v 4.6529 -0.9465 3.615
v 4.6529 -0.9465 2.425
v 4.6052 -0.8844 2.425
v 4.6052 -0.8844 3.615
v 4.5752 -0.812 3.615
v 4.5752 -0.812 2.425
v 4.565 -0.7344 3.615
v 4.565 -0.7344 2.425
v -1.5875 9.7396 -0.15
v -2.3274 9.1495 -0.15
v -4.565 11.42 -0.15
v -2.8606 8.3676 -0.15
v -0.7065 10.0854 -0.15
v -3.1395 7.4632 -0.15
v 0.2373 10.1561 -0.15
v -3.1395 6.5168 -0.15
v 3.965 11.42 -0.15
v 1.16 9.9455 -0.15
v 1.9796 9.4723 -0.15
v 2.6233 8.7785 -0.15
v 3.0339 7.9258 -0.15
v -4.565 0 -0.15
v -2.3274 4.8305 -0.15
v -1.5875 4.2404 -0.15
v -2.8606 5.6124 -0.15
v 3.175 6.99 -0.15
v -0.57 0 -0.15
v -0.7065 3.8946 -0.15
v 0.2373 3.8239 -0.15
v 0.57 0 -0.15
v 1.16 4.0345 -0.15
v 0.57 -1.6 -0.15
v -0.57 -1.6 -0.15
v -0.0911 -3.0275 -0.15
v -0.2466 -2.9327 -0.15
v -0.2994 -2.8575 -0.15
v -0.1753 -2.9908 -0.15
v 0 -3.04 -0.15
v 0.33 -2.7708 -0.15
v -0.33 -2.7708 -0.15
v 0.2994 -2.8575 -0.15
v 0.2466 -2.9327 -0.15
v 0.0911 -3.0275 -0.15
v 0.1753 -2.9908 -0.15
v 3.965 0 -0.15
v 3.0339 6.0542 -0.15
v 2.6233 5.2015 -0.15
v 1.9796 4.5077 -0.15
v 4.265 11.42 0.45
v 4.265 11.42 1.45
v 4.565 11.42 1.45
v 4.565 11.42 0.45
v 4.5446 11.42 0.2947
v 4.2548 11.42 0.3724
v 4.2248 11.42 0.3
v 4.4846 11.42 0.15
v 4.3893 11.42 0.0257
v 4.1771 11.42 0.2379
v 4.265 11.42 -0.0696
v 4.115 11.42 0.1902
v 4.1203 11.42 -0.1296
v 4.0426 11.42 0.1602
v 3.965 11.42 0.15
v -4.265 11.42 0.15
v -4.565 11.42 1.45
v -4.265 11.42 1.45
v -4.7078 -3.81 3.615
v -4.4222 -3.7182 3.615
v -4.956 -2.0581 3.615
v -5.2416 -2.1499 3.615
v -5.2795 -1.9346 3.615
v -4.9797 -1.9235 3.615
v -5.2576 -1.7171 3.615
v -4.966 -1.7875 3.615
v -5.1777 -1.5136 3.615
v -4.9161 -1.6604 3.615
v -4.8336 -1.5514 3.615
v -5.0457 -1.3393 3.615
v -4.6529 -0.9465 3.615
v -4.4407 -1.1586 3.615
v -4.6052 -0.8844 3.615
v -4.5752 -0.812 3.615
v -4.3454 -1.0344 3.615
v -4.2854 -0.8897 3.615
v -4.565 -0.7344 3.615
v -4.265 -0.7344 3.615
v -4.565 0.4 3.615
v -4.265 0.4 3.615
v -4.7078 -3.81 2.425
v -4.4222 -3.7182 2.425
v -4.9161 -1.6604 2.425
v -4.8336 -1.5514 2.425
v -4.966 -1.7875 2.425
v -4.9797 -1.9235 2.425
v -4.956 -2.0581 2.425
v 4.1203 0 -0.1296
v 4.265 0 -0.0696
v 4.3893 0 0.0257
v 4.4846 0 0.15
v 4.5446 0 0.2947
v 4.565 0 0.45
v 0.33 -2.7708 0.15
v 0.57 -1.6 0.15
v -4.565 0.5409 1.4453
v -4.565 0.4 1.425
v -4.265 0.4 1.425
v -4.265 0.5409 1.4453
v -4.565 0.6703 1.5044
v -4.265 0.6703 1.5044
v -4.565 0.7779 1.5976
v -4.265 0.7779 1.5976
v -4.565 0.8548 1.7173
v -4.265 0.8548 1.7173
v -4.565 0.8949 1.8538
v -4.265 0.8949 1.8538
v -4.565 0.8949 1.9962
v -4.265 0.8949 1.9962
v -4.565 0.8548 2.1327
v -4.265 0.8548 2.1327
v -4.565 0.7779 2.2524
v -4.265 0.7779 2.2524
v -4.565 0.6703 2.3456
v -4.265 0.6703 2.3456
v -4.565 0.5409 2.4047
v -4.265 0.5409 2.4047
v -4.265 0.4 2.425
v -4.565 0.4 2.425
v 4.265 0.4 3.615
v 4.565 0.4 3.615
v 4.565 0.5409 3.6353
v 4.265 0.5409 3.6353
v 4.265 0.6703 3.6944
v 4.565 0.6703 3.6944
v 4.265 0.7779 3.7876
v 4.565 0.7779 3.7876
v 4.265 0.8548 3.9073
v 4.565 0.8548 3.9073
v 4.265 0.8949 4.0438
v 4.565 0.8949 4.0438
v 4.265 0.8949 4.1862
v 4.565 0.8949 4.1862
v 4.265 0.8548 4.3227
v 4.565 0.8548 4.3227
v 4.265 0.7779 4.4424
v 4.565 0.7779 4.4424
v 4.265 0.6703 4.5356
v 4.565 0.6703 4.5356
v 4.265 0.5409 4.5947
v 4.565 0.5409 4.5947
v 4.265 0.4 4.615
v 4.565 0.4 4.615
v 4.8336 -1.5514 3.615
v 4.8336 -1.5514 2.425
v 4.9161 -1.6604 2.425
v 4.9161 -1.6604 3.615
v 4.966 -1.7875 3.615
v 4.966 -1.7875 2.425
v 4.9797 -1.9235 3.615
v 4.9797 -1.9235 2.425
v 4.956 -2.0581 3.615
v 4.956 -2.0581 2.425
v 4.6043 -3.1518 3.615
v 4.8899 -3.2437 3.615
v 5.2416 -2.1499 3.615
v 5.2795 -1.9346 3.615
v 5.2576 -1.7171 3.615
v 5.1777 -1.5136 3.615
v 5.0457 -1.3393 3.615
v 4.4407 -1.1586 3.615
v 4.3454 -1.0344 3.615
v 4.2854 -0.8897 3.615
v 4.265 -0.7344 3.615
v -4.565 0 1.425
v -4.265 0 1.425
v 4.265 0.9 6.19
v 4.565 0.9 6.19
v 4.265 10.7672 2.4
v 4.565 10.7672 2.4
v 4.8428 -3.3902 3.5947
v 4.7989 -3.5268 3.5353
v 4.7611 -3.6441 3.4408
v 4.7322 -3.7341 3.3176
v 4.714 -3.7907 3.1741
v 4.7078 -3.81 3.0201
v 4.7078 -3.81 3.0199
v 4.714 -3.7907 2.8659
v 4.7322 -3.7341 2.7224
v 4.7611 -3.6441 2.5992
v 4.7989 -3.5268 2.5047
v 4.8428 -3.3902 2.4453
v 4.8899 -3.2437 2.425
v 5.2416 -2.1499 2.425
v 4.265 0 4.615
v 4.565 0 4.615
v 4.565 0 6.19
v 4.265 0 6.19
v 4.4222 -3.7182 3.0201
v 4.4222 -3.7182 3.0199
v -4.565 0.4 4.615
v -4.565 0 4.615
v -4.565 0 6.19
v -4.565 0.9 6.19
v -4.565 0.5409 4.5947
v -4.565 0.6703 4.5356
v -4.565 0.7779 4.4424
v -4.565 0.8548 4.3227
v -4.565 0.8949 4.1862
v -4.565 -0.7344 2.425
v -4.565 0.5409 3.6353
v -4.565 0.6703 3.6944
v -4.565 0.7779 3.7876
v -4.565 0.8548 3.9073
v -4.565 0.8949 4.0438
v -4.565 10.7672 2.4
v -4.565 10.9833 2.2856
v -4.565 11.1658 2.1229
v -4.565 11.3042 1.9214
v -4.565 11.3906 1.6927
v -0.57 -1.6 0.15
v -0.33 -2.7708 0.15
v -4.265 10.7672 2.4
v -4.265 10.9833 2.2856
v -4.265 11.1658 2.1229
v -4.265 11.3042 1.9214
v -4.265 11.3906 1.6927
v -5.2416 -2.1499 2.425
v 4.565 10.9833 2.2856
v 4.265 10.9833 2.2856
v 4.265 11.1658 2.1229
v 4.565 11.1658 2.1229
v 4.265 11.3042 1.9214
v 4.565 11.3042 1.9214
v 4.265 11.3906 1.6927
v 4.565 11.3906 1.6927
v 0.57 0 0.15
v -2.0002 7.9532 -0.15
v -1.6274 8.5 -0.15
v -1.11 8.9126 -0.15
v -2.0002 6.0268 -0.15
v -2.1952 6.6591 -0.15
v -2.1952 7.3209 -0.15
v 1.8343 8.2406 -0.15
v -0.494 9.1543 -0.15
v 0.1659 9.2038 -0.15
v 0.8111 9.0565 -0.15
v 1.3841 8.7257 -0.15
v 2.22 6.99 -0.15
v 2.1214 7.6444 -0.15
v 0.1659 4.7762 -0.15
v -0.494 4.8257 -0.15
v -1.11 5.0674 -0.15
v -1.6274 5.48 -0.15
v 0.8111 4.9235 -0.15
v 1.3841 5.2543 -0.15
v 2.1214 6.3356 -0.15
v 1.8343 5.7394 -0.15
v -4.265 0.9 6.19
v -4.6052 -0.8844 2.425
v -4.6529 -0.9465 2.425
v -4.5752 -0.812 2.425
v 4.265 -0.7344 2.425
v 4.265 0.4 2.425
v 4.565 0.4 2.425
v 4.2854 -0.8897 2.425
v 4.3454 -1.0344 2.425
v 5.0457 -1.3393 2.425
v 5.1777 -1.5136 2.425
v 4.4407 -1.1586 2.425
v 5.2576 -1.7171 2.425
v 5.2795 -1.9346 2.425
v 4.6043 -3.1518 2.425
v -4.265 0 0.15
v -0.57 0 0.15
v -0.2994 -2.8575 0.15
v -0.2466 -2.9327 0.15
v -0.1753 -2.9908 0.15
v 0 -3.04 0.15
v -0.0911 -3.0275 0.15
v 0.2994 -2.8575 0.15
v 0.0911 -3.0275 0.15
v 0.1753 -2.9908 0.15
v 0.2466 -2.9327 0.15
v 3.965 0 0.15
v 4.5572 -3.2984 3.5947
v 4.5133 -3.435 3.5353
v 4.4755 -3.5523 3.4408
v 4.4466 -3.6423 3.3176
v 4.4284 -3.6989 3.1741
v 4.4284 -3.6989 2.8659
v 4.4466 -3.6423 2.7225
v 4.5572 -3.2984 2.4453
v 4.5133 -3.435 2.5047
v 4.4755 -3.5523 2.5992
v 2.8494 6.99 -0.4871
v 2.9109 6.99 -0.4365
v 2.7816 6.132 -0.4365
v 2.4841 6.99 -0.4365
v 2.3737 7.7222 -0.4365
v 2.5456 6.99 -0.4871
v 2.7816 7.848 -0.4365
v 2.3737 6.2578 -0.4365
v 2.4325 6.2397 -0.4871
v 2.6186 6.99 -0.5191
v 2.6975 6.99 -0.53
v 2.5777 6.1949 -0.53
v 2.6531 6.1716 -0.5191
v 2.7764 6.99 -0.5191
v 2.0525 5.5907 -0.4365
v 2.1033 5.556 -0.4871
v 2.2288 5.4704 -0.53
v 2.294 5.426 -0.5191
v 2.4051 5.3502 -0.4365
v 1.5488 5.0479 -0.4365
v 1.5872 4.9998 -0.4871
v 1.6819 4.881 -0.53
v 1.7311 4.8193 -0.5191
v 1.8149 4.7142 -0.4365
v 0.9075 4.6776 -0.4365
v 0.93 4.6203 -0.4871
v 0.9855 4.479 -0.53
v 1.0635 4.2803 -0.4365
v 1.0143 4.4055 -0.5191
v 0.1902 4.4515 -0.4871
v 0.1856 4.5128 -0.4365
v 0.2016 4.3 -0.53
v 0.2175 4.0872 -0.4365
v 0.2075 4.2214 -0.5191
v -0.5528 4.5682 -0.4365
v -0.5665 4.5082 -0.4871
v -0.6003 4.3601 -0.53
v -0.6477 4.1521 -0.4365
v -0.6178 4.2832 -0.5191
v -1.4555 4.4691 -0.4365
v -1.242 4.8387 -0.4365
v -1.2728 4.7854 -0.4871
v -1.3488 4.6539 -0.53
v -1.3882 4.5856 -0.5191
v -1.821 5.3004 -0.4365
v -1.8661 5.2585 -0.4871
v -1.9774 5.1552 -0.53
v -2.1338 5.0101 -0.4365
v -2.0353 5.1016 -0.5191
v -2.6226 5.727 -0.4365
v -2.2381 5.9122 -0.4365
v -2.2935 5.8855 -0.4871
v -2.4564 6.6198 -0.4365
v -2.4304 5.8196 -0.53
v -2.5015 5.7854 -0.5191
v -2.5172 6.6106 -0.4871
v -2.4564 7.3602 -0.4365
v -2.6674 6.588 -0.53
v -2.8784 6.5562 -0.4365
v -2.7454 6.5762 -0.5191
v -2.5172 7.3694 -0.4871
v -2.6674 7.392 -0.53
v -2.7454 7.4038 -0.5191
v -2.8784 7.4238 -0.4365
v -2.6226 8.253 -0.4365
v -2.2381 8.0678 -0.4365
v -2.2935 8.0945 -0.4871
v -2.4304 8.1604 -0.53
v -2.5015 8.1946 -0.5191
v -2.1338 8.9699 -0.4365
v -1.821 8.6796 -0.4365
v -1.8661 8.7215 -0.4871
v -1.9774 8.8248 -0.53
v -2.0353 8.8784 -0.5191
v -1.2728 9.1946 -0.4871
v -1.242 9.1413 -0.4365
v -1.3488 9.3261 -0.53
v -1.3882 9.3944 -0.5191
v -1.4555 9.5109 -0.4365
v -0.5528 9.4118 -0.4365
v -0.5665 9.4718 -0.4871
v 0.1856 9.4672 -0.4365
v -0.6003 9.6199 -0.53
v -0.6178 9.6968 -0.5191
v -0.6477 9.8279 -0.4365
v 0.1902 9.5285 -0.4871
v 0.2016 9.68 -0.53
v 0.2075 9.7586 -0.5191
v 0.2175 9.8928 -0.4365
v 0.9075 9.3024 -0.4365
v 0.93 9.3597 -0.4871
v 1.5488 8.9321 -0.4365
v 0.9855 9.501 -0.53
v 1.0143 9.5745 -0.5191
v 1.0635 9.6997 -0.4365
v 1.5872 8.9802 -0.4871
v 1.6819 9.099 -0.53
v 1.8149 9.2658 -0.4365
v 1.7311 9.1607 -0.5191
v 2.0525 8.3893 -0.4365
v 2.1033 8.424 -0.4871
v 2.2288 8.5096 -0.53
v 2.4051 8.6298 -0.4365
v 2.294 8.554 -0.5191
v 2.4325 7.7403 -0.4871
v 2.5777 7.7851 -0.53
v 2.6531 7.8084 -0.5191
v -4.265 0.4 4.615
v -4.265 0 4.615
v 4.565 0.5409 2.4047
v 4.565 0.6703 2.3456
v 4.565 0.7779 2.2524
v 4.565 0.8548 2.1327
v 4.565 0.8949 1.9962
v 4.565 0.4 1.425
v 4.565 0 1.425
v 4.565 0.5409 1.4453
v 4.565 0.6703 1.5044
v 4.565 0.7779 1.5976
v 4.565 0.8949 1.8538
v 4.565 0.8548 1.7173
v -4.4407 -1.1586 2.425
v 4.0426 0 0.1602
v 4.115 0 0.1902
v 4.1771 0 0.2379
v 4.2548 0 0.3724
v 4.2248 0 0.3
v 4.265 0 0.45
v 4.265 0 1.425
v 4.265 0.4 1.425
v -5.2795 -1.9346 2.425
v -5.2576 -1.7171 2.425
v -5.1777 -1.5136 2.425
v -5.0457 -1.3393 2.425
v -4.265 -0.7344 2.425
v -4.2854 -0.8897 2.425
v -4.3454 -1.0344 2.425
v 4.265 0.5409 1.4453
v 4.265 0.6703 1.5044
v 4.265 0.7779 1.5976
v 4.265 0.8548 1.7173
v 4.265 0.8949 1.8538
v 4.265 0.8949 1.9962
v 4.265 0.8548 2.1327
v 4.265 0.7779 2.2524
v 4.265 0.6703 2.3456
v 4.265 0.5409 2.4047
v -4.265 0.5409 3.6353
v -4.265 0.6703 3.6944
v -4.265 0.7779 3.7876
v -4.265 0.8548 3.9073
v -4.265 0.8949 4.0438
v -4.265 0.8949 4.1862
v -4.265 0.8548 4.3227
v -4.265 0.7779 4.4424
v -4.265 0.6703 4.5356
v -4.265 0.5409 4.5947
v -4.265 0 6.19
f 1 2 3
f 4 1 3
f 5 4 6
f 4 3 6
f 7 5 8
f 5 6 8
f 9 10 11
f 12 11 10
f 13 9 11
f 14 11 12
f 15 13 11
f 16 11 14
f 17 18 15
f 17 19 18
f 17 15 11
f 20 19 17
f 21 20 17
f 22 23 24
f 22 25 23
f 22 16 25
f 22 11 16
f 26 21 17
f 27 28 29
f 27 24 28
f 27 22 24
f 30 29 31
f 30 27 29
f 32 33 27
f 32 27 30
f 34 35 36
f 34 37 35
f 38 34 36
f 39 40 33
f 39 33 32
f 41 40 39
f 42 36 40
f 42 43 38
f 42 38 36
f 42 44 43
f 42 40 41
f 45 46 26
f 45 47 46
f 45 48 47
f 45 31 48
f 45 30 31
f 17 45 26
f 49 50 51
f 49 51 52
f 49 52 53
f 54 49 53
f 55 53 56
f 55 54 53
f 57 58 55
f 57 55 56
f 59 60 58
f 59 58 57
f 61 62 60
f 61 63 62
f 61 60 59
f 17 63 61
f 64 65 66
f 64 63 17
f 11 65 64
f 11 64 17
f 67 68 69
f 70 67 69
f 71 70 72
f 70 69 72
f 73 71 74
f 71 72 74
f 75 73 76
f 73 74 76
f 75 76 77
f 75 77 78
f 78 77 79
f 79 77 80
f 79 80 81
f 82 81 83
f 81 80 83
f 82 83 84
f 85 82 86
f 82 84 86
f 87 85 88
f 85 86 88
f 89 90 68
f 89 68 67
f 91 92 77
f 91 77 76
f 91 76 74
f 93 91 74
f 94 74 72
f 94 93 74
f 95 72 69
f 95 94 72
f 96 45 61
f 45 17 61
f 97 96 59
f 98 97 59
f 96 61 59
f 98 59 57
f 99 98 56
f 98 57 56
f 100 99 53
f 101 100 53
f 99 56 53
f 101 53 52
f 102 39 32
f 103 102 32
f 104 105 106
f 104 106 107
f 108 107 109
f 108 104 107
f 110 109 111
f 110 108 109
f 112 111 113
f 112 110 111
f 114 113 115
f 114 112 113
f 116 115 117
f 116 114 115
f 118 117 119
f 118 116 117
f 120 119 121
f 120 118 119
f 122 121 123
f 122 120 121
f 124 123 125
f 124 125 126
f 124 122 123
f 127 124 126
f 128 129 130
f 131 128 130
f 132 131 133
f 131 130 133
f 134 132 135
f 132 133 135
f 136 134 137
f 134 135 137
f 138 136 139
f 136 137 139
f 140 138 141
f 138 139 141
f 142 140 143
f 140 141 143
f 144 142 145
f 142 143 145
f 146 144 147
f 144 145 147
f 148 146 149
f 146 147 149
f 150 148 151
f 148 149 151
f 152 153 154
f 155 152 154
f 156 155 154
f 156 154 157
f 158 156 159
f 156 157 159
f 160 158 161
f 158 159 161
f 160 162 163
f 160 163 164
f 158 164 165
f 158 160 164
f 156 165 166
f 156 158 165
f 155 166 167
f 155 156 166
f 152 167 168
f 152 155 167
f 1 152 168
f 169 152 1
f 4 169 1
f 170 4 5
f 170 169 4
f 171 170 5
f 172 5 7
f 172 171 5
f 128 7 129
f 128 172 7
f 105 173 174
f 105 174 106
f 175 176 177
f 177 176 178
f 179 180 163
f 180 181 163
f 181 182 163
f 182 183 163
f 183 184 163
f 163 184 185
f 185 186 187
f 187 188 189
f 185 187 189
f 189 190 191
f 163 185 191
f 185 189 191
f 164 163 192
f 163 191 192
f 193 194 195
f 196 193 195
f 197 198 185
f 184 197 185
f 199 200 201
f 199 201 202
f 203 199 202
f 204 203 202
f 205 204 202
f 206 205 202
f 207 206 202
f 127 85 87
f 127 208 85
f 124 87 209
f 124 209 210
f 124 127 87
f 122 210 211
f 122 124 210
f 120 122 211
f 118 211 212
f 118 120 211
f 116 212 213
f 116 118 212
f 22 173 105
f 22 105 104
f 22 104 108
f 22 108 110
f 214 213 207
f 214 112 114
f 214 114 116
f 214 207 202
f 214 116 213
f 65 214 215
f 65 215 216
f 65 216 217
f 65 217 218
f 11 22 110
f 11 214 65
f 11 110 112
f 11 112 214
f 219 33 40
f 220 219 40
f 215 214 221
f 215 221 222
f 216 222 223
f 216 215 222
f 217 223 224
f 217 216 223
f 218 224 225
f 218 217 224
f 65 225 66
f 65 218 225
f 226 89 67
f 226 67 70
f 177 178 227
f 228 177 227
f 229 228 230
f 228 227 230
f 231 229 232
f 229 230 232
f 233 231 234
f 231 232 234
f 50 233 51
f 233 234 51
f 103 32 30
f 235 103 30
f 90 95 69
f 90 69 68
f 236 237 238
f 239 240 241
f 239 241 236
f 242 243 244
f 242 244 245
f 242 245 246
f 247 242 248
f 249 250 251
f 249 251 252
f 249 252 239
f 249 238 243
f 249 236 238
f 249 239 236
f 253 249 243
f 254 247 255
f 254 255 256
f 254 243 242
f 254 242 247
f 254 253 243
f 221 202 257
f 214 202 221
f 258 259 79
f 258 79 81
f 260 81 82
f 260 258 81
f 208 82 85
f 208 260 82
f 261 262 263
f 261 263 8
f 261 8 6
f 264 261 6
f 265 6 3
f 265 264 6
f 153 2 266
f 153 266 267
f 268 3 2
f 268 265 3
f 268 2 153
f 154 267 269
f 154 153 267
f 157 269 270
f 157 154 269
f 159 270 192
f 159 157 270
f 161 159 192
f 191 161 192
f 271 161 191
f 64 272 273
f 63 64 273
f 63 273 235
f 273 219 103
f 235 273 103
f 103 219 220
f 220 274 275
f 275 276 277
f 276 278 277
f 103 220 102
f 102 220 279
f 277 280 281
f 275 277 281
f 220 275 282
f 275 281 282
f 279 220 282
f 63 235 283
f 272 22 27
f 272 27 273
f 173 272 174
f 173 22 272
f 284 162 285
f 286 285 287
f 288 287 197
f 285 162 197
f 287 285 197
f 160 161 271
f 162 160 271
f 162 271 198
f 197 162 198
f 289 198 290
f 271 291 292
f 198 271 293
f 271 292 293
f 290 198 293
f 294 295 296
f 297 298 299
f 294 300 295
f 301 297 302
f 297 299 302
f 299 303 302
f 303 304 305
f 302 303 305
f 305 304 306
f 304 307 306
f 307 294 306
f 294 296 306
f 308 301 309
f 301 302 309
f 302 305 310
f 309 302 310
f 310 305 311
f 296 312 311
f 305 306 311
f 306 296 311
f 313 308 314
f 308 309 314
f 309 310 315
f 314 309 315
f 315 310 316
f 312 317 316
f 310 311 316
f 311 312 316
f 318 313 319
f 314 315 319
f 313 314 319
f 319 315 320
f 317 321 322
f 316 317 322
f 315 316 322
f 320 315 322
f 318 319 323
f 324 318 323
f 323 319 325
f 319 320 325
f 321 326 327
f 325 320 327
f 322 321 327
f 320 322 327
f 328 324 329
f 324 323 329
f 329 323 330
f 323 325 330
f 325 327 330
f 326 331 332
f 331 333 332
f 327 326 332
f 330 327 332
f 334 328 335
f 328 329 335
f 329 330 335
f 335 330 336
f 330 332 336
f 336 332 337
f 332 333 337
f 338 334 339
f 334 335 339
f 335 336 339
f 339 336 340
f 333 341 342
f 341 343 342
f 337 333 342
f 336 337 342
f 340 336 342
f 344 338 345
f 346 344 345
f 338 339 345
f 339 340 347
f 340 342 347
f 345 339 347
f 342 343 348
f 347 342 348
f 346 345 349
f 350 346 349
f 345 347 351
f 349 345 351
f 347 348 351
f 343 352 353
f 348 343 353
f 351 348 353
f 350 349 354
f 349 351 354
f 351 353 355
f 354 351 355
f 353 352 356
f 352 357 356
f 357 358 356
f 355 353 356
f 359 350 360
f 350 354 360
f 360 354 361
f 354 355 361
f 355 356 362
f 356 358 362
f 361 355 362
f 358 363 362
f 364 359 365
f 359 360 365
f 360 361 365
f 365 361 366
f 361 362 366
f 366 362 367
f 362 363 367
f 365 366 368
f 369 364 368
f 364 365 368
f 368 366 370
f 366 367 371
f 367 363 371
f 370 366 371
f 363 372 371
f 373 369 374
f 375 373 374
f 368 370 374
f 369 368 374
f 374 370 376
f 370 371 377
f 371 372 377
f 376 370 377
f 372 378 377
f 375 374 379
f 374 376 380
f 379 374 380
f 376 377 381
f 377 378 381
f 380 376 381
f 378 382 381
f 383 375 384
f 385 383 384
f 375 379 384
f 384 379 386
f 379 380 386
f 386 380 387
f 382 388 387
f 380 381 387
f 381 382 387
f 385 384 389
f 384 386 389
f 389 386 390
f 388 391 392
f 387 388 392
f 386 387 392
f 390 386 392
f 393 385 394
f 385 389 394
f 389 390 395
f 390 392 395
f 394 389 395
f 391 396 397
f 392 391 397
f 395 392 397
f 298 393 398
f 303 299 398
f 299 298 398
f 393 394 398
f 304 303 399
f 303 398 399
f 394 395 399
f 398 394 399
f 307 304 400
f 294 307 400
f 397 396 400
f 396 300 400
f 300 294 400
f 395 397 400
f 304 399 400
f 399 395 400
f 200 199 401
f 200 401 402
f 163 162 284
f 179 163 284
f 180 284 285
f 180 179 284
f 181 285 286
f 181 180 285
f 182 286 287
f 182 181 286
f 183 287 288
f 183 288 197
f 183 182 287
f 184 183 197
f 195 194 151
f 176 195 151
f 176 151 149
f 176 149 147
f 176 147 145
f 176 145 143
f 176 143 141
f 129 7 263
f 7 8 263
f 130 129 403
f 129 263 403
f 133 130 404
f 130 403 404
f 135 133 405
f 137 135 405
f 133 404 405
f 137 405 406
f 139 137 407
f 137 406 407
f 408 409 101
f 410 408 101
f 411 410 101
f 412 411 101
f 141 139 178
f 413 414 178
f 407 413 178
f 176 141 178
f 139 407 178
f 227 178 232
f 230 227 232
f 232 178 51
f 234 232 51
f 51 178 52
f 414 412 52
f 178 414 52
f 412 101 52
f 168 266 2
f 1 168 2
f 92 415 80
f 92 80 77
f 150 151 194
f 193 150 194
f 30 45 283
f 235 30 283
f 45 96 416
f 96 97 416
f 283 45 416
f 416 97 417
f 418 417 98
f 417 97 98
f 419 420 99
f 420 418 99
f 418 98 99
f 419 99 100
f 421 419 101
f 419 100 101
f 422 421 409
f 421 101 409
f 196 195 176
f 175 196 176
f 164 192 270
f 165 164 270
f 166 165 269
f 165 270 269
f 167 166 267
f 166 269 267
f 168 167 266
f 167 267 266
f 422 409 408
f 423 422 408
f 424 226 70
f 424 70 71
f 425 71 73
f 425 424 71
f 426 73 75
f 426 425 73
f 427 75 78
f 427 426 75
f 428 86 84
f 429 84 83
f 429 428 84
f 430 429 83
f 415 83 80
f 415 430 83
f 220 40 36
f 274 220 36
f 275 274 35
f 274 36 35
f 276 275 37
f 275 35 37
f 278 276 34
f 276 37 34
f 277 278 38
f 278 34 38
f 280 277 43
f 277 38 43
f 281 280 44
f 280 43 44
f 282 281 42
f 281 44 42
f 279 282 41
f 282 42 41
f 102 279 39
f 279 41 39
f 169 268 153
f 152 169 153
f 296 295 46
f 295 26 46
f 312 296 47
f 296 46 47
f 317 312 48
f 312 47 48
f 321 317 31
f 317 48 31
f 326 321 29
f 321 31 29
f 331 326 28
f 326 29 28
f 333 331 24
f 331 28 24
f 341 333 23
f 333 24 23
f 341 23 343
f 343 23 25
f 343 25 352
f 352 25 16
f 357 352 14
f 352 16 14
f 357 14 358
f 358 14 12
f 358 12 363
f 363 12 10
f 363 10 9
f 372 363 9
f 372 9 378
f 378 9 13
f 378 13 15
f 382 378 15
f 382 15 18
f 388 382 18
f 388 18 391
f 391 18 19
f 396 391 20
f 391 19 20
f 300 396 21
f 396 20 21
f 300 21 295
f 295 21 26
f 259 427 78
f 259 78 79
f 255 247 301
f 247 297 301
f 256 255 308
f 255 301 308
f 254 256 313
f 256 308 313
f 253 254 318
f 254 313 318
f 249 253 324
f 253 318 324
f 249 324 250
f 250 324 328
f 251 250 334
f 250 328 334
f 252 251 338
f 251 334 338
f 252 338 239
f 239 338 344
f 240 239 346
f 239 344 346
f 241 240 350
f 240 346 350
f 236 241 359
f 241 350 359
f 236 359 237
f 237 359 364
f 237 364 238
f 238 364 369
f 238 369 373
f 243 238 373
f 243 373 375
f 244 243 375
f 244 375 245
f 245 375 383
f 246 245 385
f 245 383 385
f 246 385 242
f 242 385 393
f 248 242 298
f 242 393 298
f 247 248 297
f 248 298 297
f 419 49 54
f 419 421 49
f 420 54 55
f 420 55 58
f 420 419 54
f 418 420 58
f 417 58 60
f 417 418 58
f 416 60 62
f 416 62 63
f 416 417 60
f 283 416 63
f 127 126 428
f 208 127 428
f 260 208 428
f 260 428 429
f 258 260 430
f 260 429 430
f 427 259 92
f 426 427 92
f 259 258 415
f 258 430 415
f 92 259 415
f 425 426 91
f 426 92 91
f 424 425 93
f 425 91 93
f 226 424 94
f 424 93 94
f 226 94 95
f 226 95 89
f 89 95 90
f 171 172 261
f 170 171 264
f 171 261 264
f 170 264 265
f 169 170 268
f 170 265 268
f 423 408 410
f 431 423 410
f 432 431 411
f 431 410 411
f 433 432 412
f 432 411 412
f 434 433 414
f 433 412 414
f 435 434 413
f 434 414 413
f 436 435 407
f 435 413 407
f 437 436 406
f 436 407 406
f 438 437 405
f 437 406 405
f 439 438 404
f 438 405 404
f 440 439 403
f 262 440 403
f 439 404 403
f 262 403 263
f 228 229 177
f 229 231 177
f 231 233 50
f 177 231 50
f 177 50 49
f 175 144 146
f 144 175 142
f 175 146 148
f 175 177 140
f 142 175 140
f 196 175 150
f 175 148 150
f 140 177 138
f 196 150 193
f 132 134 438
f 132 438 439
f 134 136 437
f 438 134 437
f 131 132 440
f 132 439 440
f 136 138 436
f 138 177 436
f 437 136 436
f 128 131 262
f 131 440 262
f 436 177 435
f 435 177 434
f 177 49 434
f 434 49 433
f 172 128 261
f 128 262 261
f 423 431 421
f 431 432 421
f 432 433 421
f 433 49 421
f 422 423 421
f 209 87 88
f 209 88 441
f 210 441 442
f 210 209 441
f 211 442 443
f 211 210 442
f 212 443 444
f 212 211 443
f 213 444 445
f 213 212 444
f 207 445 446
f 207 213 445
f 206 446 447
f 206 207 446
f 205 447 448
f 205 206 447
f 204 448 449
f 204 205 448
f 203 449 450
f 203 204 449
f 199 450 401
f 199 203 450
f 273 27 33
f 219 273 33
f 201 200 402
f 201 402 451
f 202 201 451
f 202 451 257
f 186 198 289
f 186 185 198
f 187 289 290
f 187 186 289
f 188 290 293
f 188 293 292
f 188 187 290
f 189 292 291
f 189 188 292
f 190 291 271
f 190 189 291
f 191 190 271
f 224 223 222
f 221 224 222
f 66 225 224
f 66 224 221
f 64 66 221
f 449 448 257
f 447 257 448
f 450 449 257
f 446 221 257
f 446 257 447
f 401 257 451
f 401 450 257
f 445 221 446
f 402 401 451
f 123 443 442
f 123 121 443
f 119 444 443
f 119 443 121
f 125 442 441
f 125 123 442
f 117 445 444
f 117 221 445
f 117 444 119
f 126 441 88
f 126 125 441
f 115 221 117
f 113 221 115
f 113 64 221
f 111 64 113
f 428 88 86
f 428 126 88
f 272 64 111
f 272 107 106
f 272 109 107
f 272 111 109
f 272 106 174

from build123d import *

# Parameters (mm, degrees)
SKETCH1_W                       = 9.13
SKETCH1_H                       = 0.3
BOSS_EXTRUDE1_DEPTH             = 11.42
BOSS_EXTRUDE3_DEPTH             = 0.3
BOSS_EXTRUDE4_DEPTH             = 0.3
FILLET2_R                       = 0.3
FILLET3_R                       = 0.6
BOSS_EXTRUDE5_REACH             = 14.701
BOSS_EXTRUDE5_DIRECTION_2_REACH = 14.701
FILLET4_R                       = 0.595


with BuildPart() as part:
    # Sketch1 → Boss-Extrude1 (new body)
    with BuildSketch(Plane(origin=(0, 0, 0), x_dir=(1, 0, 0), z_dir=(0, 1, 0))):
        Rectangle(SKETCH1_W, SKETCH1_H)
    extrude(amount=BOSS_EXTRUDE1_DEPTH)

    # Sketch3 → Boss-Extrude3 (add)
    with BuildSketch(Plane(origin=(0, 0, -0.15), x_dir=(-1, 0, 0), z_dir=(0, 0, -1))):
        with BuildLine():
            Line((-0.57, 0), (0.57, 0))
            Line((0.57, 0), (0.57, -1.6))
            Line((0.57, -1.6), (0.33, -2.770784784))
            ThreePointArc((0.33, -2.770784784), (0, -3.04), (-0.33, -2.770784784))
            Line((-0.33, -2.770784784), (-0.57, -1.6))
            Line((-0.57, -1.6), (-0.57, 0))
        make_face()
    extrude(amount=-BOSS_EXTRUDE3_DEPTH)

    # Sketch4 → Boss-Extrude4 (add)
    with BuildSketch(Plane(origin=(4.565, 0, 0), x_dir=(0, 0, -1), z_dir=(1, 0, 0))):
        with BuildLine():
            Line((-0.15, 11.42), (-0.15, 0))
            Line((-0.15, 0), (-1.425, 0))
            Line((-1.425, 0), (-1.425, 0.4))
            ThreePointArc((-1.425, 0.4), (-1.925, 0.9), (-2.425, 0.4))
            Line((-2.425, 0.4), (-2.425, 0))
            Line((-2.425, 0), (-3.615, 0))
            Line((-3.615, 0), (-3.615, 0.4))
            ThreePointArc((-3.615, 0.4), (-4.115, 0.9), (-4.615, 0.4))
            Line((-4.615, 0.4), (-4.615, 0))
            Line((-4.615, 0), (-6.19, 0))
            Line((-6.19, 0), (-6.19, 0.9))
            Line((-6.19, 0.9), (-2.4, 10.767226789))
            ThreePointArc((-2.4, 10.767226789), (-2.026327352, 11.241078061), (-1.45, 11.42))
            Line((-1.45, 11.42), (-0.15, 11.42))
        make_face()
    boss_extrude4 = extrude(amount=-BOSS_EXTRUDE4_DEPTH)

    # Fillet2
    fillet2_edges = [part.edges().sort_by_distance(p)[0] for p in [
        (4.265, 5.71, 0.15),
    ]]
    fillet(fillet2_edges, radius=FILLET2_R)

    # Fillet3
    fillet3_edges = [part.edges().sort_by_distance(p)[0] for p in [
        (4.565, 5.71, -0.15),
    ]]
    fillet(fillet3_edges, radius=FILLET3_R)

    # Boss-Extrude5: up to this face of the body (flat: up to its plane)
    boss_extrude5_end = Plane(part.part.faces().sort_by_distance((4.415, 0.2, 2.425))[0])
    # Sketch5 → Boss-Extrude5 (add, up to the picked face)
    with BuildSketch(Plane(origin=(0, 0, 3.02), x_dir=(-1, 0, 0), z_dir=(0, 0, -1)), mode=Mode.PRIVATE) as boss_extrude5_sk1:
        with BuildLine():
            Line((-4.565, 0), (-4.265, 0))
            Line((-4.265, 0), (-4.265, -0.734365081))
            ThreePointArc((-4.265, -0.734365081), (-4.31067228, -0.963975141), (-4.440735931, -1.15862915))
            Line((-4.440735931, -1.15862915), (-4.833553391, -1.551446609))
            ThreePointArc((-4.833553391, -1.551446609), (-4.966005966, -1.787534255), (-4.95599841, -2.058053958))
            Line((-4.95599841, -2.058053958), (-4.422200477, -3.718167625))
            Line((-4.422200477, -3.718167625), (-4.707799523, -3.81))
            Line((-4.707799523, -3.81), (-5.241597456, -2.149886332))
            ThreePointArc((-5.241597456, -2.149886332), (-5.257609545, -1.717054807), (-5.045685425, -1.339314575))
            Line((-5.045685425, -1.339314575), (-4.652867966, -0.946497116))
            ThreePointArc((-4.652867966, -0.946497116), (-4.58783614, -0.849170111), (-4.565, -0.734365081))
            Line((-4.565, -0.734365081), (-4.565, 0))
        make_face()
    boss_extrude5_tool1 = split(extrude(boss_extrude5_sk1.sketch, amount=BOSS_EXTRUDE5_REACH, mode=Mode.PRIVATE), bisect_by=boss_extrude5_end, keep=Keep.BOTH, mode=Mode.PRIVATE)
    boss_extrude5 = boss_extrude5_tool1.solids().sort_by(Axis((4.415, -0.039429, 3.02), (0, 0, -1)))[0]
    add(boss_extrude5)

    # Boss-Extrude5 direction 2: up to this face of the body (flat: up to its plane)
    boss_extrude5_direction_2_end = Plane(part.part.faces().sort_by_distance((4.415, 0.2, 3.615))[0])
    # Sketch5 → Boss-Extrude5 direction 2 (add, up to the picked face)
    with BuildSketch(Plane(origin=(0, 0, 3.02), x_dir=(-1, 0, 0), z_dir=(0, 0, -1)), mode=Mode.PRIVATE) as boss_extrude5_direction_2_sk1:
        with BuildLine():
            Line((-4.565, 0), (-4.265, 0))
            Line((-4.265, 0), (-4.265, -0.734365081))
            ThreePointArc((-4.265, -0.734365081), (-4.31067228, -0.963975141), (-4.440735931, -1.15862915))
            Line((-4.440735931, -1.15862915), (-4.833553391, -1.551446609))
            ThreePointArc((-4.833553391, -1.551446609), (-4.966005966, -1.787534255), (-4.95599841, -2.058053958))
            Line((-4.95599841, -2.058053958), (-4.422200477, -3.718167625))
            Line((-4.422200477, -3.718167625), (-4.707799523, -3.81))
            Line((-4.707799523, -3.81), (-5.241597456, -2.149886332))
            ThreePointArc((-5.241597456, -2.149886332), (-5.257609545, -1.717054807), (-5.045685425, -1.339314575))
            Line((-5.045685425, -1.339314575), (-4.652867966, -0.946497116))
            ThreePointArc((-4.652867966, -0.946497116), (-4.58783614, -0.849170111), (-4.565, -0.734365081))
            Line((-4.565, -0.734365081), (-4.565, 0))
        make_face()
    boss_extrude5_direction_2_tool1 = split(extrude(boss_extrude5_direction_2_sk1.sketch, amount=-BOSS_EXTRUDE5_DIRECTION_2_REACH, mode=Mode.PRIVATE), bisect_by=boss_extrude5_direction_2_end, keep=Keep.BOTH, mode=Mode.PRIVATE)
    boss_extrude5_direction_2 = boss_extrude5_direction_2_tool1.solids().sort_by(Axis((4.415, -0.039429, 3.02), (0, 0, 1)))[0]
    add(boss_extrude5_direction_2)

    # Fillet4
    fillet4_edges = [part.edges().sort_by_distance(p)[0] for p in [
        (4.565, -3.764083813, 2.425),
        (4.565, -3.764083813, 3.615),
    ]]
    fillet(fillet4_edges, radius=FILLET4_R - 0.0001)  # a hair under: the kernel refuses the full size

    # Mirror1: Boss-Extrude4, Boss-Extrude5, Boss-Extrude5 direction 2 across plane
    add(boss_extrude4.mirror(Plane(origin=(0, 0, 0), x_dir=(0, 0, 1), z_dir=(1, 0, 0))))
    add(boss_extrude5.mirror(Plane(origin=(0, 0, 0), x_dir=(0, 0, 1), z_dir=(1, 0, 0))))
    add(boss_extrude5_direction_2.mirror(Plane(origin=(0, 0, 0), x_dir=(0, 0, 1), z_dir=(1, 0, 0))))

    # Sketch7 → Revolve2 (revolve)
    with BuildSketch(Plane(origin=(0, 0, 0), x_dir=(0, 0, -1), z_dir=(1, 0, 0)), mode=Mode.PRIVATE) as revolve2_sk:
        with BuildLine():
            Line((0.15, 9.21), (0.436483674, 9.474099927))
            ThreePointArc((0.436483674, 9.474099927), (0.53, 9.6875), (0.436483674, 9.900900073))
            Line((0.436483674, 9.900900073), (0.15, 10.165))
            Line((0.15, 10.165), (0.15, 9.21))
        make_face()
    revolve(revolve2_sk.sketch.rotate(Axis((0, 6.99, -0.15), (0, 0, -1)), 90), axis=Axis((0, 6.99, -0.15), (0, 0, -1)))


solid = part.part
